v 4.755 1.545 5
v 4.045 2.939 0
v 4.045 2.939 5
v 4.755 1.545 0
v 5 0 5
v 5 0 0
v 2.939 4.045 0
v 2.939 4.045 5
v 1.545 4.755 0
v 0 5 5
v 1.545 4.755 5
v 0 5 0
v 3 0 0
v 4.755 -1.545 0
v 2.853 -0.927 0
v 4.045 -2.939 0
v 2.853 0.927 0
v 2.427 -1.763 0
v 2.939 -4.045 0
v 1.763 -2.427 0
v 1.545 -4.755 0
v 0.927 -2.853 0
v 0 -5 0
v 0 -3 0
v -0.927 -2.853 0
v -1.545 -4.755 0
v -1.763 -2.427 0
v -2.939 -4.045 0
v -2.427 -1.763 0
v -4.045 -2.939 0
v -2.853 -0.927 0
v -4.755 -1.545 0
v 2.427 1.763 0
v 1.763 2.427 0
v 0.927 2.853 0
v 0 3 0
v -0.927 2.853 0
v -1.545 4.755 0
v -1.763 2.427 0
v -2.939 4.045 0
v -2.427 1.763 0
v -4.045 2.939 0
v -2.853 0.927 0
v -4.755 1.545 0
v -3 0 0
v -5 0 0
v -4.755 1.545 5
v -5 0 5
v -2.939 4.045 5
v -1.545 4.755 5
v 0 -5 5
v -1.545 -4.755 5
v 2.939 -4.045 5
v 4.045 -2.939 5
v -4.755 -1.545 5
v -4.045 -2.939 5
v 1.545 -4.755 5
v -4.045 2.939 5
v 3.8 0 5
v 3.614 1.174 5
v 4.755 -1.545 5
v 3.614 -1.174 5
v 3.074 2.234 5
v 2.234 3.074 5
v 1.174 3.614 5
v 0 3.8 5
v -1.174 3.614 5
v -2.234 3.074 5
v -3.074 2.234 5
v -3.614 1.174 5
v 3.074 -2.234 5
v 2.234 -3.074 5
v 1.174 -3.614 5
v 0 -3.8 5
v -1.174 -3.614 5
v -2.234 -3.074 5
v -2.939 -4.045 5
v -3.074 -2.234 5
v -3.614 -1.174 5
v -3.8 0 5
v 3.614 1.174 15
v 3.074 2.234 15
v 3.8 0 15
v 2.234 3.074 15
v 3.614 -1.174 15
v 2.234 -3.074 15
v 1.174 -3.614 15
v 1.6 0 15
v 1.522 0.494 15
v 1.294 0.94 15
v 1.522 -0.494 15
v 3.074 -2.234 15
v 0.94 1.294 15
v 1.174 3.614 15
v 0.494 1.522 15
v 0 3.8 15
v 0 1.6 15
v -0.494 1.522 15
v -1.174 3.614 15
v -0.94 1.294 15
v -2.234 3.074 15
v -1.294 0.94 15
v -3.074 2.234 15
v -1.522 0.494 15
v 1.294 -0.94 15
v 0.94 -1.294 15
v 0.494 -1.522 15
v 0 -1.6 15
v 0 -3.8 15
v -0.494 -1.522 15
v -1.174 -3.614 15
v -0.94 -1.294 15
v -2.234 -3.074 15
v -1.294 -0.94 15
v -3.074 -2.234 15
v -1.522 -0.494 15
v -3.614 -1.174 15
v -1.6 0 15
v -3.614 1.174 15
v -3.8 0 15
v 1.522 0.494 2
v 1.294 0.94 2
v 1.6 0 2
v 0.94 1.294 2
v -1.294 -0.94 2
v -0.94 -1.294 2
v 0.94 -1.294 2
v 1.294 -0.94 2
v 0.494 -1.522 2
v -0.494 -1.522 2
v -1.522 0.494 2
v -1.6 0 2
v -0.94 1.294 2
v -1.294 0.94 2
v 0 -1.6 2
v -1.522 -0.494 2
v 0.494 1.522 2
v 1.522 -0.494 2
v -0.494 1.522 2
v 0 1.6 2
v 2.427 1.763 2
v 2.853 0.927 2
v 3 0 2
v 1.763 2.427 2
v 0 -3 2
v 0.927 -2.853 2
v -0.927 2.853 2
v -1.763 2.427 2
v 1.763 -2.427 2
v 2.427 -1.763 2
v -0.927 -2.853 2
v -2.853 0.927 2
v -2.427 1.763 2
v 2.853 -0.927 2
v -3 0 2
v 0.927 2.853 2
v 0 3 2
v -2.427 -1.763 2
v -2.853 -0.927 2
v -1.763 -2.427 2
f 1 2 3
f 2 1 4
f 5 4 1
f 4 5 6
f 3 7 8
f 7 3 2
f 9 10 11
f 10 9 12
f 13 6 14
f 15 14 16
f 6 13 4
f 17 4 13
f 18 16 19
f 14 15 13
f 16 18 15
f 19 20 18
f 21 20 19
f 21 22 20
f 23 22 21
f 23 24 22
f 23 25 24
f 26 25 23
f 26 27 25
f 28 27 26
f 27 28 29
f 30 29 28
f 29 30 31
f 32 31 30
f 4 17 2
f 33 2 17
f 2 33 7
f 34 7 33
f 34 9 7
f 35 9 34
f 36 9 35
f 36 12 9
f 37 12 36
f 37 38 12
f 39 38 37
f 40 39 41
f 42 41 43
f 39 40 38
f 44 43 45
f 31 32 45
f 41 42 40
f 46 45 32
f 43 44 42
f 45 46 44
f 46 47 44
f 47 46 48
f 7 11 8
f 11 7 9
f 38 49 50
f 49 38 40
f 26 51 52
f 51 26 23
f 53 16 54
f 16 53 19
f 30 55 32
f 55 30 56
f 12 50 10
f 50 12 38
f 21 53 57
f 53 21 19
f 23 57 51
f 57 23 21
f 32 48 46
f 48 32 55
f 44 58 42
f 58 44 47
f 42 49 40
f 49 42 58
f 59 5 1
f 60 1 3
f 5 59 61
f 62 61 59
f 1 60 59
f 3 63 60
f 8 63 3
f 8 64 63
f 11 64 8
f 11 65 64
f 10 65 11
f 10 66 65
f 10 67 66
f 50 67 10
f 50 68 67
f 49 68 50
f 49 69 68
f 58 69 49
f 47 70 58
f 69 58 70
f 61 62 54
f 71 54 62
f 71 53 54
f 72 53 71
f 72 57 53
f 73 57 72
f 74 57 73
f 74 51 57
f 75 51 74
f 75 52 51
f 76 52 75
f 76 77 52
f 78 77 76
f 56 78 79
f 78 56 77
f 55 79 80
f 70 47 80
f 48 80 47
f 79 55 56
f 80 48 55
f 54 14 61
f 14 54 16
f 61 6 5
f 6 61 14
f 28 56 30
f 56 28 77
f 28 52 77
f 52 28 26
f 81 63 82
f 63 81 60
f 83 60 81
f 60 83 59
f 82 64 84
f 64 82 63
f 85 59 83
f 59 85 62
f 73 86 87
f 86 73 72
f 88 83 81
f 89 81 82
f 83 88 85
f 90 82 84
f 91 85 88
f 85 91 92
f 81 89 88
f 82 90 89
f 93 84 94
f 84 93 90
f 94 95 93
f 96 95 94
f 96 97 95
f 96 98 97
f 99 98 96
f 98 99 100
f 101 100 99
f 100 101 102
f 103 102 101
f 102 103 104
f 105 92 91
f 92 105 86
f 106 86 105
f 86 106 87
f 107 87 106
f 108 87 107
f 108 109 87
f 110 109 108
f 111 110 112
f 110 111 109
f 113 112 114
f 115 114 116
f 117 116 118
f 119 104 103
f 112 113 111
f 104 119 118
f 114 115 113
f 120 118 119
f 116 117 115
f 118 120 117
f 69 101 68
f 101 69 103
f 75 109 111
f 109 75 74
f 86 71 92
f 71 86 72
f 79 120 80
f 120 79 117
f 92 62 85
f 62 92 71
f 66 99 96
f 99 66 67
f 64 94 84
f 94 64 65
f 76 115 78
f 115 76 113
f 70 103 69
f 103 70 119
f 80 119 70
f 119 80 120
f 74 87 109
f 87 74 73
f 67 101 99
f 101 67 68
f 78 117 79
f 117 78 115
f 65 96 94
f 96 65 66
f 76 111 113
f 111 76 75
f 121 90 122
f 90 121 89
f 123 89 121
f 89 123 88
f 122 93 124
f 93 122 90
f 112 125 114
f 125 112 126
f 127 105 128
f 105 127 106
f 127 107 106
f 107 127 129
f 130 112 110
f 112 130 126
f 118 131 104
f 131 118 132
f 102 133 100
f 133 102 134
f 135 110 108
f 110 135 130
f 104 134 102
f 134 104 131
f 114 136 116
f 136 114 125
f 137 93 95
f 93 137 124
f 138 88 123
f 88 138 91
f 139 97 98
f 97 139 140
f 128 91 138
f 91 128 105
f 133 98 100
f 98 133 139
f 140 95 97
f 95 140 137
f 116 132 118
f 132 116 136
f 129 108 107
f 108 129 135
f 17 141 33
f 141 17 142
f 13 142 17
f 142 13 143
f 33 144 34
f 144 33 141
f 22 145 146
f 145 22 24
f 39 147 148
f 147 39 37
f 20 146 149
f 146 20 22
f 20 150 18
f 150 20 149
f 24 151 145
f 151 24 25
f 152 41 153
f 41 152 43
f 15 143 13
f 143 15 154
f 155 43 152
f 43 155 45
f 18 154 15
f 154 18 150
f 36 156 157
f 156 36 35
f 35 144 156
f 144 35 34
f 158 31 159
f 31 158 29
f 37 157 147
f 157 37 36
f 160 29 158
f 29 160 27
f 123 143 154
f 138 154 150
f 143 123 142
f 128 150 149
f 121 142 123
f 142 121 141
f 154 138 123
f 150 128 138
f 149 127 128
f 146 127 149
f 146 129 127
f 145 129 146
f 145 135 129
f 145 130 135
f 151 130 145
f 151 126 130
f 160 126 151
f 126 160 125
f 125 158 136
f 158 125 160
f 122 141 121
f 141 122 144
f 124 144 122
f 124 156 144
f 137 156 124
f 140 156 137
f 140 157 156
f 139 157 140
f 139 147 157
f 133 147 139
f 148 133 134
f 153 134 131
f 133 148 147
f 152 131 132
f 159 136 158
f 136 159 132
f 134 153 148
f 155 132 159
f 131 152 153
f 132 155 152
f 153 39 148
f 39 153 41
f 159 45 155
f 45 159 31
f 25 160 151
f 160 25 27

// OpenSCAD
r1i = 3.0;
r1o = r1i + 2.0;
h1i = 2.0;
h1o = 5.0;

r2i = 1.6;
r2o = r2i + 2.2;
h2 = 10;

$fn=20;

difference() {
  union() {
    cylinder( h=h1o, r=r1o );
    translate( [0,0,h1o] ) cylinder( h=h2, r=r2o );
  }
  cylinder( h=h1o + h2, r=r2i );
  cylinder( h=h1i, r=r1i );
}
